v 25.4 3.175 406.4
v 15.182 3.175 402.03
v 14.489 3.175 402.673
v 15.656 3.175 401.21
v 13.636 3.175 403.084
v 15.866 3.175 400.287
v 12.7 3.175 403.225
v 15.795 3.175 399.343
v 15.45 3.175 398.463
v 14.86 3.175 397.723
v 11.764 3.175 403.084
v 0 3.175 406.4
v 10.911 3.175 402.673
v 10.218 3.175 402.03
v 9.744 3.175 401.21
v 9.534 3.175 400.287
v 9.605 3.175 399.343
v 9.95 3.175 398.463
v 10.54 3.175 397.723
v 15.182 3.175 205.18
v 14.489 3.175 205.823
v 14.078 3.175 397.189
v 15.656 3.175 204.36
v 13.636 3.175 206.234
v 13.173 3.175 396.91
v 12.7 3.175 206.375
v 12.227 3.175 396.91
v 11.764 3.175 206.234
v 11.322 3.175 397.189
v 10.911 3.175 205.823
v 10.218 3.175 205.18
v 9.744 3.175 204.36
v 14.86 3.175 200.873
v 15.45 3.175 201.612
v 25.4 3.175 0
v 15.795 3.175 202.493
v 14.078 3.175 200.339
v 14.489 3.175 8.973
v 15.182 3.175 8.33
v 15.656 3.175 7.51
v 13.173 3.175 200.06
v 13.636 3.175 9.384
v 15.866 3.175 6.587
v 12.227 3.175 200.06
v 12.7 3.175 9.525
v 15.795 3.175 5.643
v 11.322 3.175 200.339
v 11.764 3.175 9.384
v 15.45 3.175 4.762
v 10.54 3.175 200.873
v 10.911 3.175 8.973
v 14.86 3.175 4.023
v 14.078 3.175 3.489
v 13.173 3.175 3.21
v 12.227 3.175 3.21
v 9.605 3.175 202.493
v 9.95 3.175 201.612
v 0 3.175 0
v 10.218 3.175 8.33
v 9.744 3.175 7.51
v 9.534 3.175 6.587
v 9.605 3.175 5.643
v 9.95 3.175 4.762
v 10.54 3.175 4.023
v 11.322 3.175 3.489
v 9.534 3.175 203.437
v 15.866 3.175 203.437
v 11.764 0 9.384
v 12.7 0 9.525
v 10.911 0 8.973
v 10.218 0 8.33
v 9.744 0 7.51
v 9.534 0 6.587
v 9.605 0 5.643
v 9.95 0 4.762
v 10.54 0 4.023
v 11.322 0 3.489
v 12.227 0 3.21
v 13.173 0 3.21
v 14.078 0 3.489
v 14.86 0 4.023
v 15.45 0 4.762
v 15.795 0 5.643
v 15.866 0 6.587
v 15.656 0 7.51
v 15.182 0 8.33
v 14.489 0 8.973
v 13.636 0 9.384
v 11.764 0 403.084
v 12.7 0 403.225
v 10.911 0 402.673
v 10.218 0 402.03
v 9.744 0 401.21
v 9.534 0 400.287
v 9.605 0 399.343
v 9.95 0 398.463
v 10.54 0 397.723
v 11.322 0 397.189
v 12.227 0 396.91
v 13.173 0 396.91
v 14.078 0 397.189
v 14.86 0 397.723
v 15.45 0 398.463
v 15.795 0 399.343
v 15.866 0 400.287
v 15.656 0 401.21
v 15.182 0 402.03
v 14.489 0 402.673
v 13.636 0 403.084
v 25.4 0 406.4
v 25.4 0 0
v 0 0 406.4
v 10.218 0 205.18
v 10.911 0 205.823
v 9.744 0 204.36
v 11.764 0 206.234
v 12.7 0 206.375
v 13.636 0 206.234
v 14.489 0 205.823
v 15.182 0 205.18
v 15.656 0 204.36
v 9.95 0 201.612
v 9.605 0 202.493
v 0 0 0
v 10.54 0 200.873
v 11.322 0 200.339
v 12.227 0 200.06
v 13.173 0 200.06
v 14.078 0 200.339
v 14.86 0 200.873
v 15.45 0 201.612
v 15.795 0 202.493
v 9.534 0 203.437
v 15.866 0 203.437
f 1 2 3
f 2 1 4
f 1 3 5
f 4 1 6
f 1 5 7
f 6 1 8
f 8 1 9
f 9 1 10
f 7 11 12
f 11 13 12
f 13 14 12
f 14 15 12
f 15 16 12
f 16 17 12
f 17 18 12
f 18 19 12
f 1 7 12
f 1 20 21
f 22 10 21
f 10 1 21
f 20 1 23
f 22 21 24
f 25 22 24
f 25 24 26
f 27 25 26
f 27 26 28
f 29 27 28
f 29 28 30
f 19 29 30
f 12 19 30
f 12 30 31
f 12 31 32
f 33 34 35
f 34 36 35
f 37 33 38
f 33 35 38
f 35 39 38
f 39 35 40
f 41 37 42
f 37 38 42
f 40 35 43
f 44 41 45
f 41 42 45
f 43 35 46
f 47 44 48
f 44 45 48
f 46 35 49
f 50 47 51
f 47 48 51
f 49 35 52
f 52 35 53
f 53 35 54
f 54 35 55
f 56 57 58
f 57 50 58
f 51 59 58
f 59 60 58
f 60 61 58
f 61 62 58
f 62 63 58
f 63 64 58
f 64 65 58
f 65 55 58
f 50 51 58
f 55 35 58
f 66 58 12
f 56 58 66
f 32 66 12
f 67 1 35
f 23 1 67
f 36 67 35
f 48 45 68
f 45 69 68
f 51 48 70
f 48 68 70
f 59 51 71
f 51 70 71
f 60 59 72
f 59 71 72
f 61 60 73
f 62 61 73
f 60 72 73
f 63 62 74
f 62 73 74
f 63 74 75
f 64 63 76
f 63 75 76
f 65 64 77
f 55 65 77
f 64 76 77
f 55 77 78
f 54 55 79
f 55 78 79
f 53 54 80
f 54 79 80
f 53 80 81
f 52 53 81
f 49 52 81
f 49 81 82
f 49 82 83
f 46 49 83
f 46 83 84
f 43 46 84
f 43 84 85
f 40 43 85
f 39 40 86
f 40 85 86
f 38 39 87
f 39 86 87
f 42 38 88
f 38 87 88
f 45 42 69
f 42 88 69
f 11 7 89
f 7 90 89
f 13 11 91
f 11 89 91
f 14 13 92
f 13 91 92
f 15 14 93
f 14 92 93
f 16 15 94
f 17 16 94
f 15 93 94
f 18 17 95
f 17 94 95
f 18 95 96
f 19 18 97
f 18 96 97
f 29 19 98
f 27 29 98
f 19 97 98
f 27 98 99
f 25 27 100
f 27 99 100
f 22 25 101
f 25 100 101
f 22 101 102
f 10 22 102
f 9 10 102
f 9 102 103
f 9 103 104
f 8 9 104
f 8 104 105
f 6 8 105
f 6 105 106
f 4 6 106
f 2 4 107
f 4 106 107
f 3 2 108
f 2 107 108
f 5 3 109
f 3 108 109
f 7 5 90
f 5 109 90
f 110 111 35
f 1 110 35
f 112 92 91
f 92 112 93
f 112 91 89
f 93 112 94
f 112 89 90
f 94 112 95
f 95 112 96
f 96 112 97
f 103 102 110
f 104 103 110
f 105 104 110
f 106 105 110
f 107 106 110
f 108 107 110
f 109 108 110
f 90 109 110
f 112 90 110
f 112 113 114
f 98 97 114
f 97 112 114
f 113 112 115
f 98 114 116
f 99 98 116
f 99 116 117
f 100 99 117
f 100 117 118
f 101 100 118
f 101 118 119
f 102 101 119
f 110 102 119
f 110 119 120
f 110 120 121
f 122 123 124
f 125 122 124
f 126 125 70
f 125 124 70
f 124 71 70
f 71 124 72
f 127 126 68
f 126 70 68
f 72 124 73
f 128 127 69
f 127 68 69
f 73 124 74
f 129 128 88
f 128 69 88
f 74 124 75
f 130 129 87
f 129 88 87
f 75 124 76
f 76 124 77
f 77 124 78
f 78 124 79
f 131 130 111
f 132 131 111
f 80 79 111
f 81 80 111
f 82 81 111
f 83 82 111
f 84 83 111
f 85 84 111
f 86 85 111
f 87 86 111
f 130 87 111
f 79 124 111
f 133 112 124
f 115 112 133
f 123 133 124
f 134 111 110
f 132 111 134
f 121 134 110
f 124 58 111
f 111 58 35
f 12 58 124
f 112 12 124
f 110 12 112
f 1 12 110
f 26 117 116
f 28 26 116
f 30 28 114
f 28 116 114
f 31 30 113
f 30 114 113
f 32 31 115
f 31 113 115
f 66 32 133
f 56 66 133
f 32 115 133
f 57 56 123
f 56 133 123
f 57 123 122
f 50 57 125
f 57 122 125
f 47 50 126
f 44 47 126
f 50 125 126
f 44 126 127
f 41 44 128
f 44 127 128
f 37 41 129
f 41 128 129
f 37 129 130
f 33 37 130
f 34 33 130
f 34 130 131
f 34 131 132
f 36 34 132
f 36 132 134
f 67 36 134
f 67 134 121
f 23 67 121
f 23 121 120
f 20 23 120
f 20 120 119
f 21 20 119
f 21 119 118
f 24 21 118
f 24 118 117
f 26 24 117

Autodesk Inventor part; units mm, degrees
ref_plane "YZ Plane" through (0, 0, 0) normal (1, 0, 0) x (0, 1, 0)
ref_plane "XZ Plane" through (0, 0, 0) normal (0, 1, 0) x (-1, 0, 0)
ref_plane "XY Plane" through (0, 0, 0) normal (0, 0, 1) x (1, 0, 0)
sketch "Sketch1" plane through (0, 0, 0) normal (0, 0, 1) x (1, 0, 0)
  line L0 (0, 0) -> (25.4, 0)
  line L1 (25.4, 0) -> (25.4, 3.175)
  line L2 (25.4, 3.175) -> (0, 3.175)
  line L3 (0, 3.175) -> (0, 0)
  dimension "d0" = 25.4
  dimension "d1" = 3.175
extrude "Extrusion1" add sketch "Sketch1" along normal blind 406.4
sketch "Sketch2" plane through (0, 3.175, 0) normal (0, 1, 0) x (1, 0, 0)
  line L0 (0, 0) -> (25.4, 0)
  line L1 (0, 0) -> (25.4, 0) projected
  line L2 (12.7, 0) -> (12.7, -406.4)
  line L3 (0, -406.4) -> (25.4, -406.4)
  line L4 (12.7, 0) -> (12.7, -6.35)
  line L5 (12.7, -406.4) -> (12.7, -400.05)
  line L6 (12.7, -406.4) -> (12.7, -203.2)
  dimension "d4" = 6.35
  dimension "d5" = 6.35
  dimension "d6" = 203.2
hole "Hole1" at (12.7, 3.175, 6.35) at (12.7, 3.175, 400.05) at (12.7, 3.175, 203.2) direction (0, -1, 0) diameter 6.35 end through all
properties part number "Jack FlatStock"
